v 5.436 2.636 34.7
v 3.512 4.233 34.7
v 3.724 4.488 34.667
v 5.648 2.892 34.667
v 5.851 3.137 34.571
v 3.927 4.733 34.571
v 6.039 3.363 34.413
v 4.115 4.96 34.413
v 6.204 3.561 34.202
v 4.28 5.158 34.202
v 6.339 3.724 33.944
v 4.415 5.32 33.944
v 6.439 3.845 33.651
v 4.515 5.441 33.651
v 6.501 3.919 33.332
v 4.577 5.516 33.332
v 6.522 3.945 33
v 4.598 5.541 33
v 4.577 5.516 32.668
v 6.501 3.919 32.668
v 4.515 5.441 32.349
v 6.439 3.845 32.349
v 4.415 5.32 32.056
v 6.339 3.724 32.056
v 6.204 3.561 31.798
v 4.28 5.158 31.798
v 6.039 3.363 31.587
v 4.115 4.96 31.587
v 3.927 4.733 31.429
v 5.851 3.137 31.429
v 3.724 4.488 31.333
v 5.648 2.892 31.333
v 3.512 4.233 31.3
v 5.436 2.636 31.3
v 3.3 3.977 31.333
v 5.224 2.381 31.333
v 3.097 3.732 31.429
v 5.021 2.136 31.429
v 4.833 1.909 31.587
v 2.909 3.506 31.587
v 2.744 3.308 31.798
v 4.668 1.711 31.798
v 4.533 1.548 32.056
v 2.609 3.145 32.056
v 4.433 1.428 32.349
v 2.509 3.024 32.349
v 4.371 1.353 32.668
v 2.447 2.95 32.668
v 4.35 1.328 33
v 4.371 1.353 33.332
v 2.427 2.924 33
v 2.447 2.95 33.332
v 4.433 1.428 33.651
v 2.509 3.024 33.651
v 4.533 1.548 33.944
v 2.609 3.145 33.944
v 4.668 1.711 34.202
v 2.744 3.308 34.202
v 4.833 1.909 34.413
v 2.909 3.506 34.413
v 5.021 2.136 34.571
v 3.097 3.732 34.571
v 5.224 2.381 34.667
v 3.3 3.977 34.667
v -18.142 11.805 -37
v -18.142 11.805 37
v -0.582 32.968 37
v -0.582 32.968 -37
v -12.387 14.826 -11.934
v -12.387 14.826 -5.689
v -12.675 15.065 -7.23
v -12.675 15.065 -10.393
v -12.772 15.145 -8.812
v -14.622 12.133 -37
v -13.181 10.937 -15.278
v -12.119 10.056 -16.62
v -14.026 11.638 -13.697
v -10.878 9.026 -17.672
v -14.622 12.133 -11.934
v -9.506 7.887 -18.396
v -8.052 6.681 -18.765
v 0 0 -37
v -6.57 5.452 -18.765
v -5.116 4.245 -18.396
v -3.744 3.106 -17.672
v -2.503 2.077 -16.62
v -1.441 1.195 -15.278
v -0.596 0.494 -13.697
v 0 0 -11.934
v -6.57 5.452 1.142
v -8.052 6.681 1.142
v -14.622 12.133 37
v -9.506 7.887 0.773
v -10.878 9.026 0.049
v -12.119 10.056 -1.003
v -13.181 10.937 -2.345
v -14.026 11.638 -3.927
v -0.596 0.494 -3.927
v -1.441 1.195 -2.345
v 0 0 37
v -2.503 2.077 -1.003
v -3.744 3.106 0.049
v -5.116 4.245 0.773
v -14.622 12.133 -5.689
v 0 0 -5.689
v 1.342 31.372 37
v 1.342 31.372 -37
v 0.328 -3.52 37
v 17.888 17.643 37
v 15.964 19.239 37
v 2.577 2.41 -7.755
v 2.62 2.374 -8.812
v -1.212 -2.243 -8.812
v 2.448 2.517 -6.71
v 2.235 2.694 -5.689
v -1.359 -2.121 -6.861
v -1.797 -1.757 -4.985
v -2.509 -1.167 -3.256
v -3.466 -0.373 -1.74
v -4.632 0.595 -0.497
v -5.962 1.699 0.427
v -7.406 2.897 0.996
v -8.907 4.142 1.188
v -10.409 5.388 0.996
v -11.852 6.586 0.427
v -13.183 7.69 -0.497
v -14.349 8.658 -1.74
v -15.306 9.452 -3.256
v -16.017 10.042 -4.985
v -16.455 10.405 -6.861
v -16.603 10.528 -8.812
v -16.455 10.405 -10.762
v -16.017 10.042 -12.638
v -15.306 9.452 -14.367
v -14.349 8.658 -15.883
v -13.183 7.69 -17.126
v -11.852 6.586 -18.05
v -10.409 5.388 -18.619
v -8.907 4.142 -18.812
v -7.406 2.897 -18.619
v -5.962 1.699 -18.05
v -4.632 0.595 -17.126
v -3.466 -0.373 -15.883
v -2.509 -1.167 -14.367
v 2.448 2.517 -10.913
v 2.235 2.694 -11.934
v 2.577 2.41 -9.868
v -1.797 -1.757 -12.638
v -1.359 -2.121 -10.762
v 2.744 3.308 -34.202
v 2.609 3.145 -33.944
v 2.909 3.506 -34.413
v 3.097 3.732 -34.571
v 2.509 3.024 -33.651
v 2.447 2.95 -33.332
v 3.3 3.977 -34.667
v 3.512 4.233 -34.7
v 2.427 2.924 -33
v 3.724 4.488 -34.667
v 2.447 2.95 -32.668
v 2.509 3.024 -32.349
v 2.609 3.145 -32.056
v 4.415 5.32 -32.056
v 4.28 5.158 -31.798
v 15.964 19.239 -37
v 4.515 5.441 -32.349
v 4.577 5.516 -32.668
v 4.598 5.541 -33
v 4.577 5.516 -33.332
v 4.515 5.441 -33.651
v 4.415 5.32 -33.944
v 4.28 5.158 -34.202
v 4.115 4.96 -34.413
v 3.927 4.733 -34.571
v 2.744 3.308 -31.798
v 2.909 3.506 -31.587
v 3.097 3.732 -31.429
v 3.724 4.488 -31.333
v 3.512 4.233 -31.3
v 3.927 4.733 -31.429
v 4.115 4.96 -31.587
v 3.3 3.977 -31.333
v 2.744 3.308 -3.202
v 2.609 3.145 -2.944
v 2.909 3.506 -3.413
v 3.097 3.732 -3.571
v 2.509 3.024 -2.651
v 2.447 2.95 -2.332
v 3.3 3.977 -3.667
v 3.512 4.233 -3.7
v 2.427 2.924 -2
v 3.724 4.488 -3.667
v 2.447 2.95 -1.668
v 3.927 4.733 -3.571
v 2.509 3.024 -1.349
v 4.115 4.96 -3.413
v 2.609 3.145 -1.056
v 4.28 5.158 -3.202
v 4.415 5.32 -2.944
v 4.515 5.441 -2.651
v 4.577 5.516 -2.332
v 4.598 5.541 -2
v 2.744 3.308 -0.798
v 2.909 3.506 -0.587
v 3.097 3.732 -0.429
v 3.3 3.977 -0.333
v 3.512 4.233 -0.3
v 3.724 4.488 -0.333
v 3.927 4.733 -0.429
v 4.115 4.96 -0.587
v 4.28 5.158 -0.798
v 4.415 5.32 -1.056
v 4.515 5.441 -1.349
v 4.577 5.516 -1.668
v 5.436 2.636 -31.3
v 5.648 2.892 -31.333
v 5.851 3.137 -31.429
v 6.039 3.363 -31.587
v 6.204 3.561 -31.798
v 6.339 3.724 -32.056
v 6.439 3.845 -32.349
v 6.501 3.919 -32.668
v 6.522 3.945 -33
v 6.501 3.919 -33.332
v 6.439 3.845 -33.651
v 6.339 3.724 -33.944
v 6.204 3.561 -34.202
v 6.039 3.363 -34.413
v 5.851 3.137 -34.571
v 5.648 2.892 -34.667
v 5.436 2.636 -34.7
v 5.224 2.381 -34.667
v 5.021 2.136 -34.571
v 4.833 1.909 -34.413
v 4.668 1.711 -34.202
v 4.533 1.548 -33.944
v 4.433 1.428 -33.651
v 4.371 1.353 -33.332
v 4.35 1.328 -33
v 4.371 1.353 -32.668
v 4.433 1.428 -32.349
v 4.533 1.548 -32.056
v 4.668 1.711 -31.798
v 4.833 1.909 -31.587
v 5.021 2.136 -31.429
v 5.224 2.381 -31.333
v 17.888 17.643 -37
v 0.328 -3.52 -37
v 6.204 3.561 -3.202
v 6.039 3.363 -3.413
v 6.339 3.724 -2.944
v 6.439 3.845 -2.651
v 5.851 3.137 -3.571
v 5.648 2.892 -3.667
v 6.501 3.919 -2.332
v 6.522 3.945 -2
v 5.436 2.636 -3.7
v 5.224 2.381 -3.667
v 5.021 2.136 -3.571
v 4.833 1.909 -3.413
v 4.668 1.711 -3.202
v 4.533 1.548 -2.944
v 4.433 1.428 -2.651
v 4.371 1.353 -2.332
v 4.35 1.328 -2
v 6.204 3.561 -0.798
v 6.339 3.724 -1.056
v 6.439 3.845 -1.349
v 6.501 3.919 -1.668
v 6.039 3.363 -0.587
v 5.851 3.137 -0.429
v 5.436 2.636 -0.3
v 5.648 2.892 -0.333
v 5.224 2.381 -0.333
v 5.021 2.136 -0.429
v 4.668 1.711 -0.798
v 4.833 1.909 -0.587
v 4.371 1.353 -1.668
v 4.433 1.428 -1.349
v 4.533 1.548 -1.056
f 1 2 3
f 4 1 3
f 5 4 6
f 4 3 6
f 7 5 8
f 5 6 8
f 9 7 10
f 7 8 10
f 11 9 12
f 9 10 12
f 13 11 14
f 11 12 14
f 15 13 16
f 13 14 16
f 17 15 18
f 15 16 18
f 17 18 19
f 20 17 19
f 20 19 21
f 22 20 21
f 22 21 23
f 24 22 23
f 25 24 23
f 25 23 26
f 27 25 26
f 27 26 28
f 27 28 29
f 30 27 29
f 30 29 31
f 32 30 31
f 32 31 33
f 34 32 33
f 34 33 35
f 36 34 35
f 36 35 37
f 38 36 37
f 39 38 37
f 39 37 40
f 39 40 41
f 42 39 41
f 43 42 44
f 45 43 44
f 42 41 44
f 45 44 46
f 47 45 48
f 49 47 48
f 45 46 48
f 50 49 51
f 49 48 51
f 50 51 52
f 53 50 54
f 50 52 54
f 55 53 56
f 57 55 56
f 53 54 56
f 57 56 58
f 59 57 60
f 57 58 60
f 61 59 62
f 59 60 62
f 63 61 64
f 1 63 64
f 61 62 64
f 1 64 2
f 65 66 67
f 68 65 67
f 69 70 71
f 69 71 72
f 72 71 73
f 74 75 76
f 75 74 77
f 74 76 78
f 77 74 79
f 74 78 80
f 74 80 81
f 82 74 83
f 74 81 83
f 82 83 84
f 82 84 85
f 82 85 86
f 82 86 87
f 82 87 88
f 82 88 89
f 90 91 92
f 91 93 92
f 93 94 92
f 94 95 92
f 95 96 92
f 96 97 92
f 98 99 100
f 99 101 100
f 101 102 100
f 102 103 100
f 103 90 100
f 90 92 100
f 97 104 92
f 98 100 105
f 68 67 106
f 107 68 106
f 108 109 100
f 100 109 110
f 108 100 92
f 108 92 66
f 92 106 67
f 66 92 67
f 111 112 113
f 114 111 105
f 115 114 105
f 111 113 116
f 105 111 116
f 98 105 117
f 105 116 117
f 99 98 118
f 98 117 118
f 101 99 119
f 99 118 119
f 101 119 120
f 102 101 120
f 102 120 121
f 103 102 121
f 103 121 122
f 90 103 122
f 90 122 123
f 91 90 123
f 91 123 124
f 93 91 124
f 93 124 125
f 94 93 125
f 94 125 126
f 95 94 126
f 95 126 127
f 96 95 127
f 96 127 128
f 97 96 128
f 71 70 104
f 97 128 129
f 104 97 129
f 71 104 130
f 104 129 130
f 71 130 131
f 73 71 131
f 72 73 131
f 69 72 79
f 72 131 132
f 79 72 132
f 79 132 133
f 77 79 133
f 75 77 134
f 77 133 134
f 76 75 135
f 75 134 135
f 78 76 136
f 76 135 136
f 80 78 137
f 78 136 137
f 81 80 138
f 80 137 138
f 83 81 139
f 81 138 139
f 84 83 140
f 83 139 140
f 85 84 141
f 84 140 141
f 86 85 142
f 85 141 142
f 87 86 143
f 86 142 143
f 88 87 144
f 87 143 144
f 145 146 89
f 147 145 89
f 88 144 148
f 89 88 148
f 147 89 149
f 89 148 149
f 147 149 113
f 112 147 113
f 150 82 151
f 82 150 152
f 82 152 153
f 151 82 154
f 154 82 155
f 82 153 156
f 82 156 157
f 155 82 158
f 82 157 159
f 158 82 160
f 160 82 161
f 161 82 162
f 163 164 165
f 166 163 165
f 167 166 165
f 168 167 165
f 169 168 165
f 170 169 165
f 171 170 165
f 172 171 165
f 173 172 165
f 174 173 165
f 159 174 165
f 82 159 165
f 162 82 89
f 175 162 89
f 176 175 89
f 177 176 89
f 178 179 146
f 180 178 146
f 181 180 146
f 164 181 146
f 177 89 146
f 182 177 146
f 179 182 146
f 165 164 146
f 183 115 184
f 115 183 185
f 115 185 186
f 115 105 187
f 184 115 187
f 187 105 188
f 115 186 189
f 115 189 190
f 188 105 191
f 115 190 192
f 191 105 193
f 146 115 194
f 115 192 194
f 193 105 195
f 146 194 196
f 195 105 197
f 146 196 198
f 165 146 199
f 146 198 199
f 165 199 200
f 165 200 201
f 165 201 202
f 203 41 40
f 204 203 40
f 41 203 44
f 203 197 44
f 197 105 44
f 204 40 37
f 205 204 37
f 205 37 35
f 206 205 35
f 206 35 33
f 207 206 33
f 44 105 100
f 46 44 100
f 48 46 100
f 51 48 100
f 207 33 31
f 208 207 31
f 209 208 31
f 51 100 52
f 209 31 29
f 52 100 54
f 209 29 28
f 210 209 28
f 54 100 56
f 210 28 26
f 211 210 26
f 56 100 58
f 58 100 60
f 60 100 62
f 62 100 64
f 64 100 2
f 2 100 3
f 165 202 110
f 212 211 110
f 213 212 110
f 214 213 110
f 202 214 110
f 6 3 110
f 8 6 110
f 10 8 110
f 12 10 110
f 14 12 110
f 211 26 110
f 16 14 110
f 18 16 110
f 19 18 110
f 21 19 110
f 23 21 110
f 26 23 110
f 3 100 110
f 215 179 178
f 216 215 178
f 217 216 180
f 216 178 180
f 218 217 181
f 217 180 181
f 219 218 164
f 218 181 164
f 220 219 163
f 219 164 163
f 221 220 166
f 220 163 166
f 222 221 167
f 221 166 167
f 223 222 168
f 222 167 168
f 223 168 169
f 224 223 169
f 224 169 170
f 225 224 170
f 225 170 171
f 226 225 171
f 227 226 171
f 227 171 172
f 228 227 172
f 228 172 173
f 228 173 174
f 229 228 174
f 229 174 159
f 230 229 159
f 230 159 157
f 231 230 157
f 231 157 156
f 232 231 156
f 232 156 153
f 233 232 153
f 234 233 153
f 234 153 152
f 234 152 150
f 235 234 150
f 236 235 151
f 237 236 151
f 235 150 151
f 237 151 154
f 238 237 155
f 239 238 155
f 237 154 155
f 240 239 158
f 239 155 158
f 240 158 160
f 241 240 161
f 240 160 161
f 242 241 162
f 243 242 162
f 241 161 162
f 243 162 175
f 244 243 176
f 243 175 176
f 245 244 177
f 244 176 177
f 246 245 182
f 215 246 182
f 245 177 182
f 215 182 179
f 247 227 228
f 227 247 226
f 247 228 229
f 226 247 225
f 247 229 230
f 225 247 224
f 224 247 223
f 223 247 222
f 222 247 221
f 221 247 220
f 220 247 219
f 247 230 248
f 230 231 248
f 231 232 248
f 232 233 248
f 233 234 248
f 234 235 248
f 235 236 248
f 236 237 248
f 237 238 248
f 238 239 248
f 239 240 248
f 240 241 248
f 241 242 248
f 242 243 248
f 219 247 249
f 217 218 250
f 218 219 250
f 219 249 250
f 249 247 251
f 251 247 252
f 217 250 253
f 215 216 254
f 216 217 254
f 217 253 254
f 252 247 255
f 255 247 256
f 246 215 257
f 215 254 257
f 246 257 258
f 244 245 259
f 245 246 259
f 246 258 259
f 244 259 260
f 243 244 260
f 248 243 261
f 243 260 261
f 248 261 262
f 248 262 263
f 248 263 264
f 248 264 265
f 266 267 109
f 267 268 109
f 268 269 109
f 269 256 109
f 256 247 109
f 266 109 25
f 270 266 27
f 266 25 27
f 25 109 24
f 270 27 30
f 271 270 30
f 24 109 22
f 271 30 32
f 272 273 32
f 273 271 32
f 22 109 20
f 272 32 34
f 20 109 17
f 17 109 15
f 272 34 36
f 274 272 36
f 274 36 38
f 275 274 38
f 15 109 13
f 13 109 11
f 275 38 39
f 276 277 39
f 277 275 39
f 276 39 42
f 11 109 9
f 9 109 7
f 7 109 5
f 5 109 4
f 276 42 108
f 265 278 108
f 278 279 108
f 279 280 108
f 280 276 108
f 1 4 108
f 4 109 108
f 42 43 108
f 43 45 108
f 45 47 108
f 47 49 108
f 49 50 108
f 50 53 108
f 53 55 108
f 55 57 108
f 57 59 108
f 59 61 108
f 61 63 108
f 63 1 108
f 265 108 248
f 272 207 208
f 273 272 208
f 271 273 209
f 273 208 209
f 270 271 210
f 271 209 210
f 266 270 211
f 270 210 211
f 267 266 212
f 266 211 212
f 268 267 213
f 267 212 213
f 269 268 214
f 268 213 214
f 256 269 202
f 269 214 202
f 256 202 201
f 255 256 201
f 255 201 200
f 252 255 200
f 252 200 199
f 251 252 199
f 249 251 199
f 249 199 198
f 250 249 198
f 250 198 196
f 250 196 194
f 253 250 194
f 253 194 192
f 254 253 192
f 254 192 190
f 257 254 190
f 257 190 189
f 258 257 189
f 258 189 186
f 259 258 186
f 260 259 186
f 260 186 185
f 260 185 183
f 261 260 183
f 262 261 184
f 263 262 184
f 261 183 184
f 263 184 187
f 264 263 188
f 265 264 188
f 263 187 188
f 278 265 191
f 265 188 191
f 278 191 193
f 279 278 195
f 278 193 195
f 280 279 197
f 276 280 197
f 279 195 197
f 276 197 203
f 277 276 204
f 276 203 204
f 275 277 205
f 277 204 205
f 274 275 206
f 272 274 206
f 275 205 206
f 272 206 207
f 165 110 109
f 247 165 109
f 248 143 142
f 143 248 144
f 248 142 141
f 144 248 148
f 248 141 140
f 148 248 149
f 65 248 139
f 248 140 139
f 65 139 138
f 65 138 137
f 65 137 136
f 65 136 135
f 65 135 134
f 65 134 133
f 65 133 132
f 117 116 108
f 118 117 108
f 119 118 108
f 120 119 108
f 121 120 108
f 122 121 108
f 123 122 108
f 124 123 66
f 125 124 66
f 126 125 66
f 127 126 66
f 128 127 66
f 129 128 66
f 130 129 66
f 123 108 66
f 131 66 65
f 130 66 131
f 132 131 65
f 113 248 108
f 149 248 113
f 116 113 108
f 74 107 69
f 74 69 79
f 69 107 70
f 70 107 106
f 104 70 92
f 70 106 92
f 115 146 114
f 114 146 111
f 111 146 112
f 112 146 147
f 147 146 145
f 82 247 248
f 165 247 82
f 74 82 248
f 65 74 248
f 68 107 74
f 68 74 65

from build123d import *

# Parameters (mm, degrees)
ESTRUSIONE_SOTTILE1_DEPTH      = 37
ESTRUSIONE_SOTTILE1_DEPTH_BACK = 37
SCHIZZO2_R                     = 1.7
TAGLIO_ESTRUSIONE2_DEPTH       = 23
SCHIZZO3_R                     = 10
TAGLIO_ESTRUSIONE3_DEPTH       = 6
SCHIZZO4_W                     = 19
SCHIZZO4_H                     = 35
TAGLIO_ESTRUSIONE4_DEPTH       = 9
SCHIZZO5_R                     = 1.7
TAGLIO_ESTRUSIONE5_DEPTH       = 9
TAGLIO_ESTRUSIONE6_DEPTH       = 38
TAGLIO_ESTRUSIONE6_DEPTH_BACK  = 38


with BuildPart() as part:
    # Schizzo1 → Estrusione-Sottile1 (new body, two sides)
    with BuildSketch(Plane.XY) as estrusione_sottile1_sk:
        with BuildLine():
            Line((1.3418419, 31.371953403), (-14.62198067, 12.132505153))
            Line((-14.62198067, 12.132505153), (0, 0))
            Line((0, 0), (76.626348337, 92.349351598))
            ThreePointArc((76.626348337, 92.349351598), (100.821605793, 105.569380982), (125.016863249, 92.349351598))
            Line((125.016863249, 92.349351598), (132.637123428, 81.561358928))
            Line((132.637123428, 81.561358928), (153.805626203, 63.996914357))
            Line((153.805626203, 63.996914357), (152.209243946, 62.072969532))
            Line((152.209243946, 62.072969532), (130.786083182, 79.848715119))
            Line((130.786083182, 79.848715119), (122.942210931, 90.953275114))
            ThreePointArc((122.942210931, 90.953275114), (100.774095149, 103.069337988), (78.649981188, 90.873112409))
            Line((78.649981188, 90.873112409), (0.327562568, -3.520327082))
            Line((0.327562568, -3.520327082), (-18.142307752, 11.804942585))
            Line((-18.142307752, 11.804942585), (-0.582102925, 32.96833566))
            Line((-0.582102925, 32.96833566), (1.3418419, 31.371953403))
        make_face()
    extrude(amount=ESTRUSIONE_SOTTILE1_DEPTH)
    extrude(estrusione_sottile1_sk.sketch, amount=-ESTRUSIONE_SOTTILE1_DEPTH_BACK)

    # Schizzo2 → Taglio-Estrusione2 (cut)
    with BuildSketch(Plane(origin=(1.923944825, -1.596382257, 0), x_dir=(0, 0, -1), z_dir=(0.76957793, -0.638552903, 0))):
        with Locations((-6.552412565, 114.869422042)):
            Circle(SCHIZZO2_R)
        with Locations((-6.552412565, 104.052556993)):
            Circle(SCHIZZO2_R)
        with Locations((1.452296176, 109.710473024)):
            Circle(SCHIZZO2_R)
        with Locations((9.457004918, 104.551524007)):
            Circle(SCHIZZO2_R)
        with Locations((1.553386665, 98.82845624)):
            Circle(SCHIZZO2_R)
        with Locations((9.659185895, 93.604355486)):
            Circle(SCHIZZO2_R)
    extrude(amount=-TAGLIO_ESTRUSIONE2_DEPTH, mode=Mode.SUBTRACT)

    # Schizzo3 → Taglio-Estrusione3 (cut)
    with BuildSketch(Plane(origin=(-1.596382257, -1.923944825, 0), x_dir=(0.76957793, -0.638552903, 0), z_dir=(-0.638552903, -0.76957793, 0))):
        with Locations((-9.5, -8.811563563)):
            Circle(SCHIZZO3_R)
    extrude(amount=-TAGLIO_ESTRUSIONE3_DEPTH, mode=Mode.SUBTRACT)

    # Schizzo4 → Taglio-Estrusione4 (cut)
    with BuildSketch(Plane(origin=(0, 0, 0), x_dir=(0, 0, 1), z_dir=(-0.76957793, 0.638552903, 0))):
        with Locations((-7.5, 57.5)):
            Rectangle(SCHIZZO4_W, SCHIZZO4_H)
    extrude(amount=-TAGLIO_ESTRUSIONE4_DEPTH, mode=Mode.SUBTRACT)

    # Schizzo5 → Taglio-Estrusione5 (cut)
    with BuildSketch(Plane(origin=(0, 0, 0), x_dir=(0, 0, 1), z_dir=(-0.76957793, 0.638552903, 0))):
        with Locations((33, 5.5)):
            Circle(SCHIZZO5_R)
        with Locations((-33, 5.5)):
            Circle(SCHIZZO5_R)
        with Locations((-2, 5.5)):
            Circle(SCHIZZO5_R)
    extrude(amount=-TAGLIO_ESTRUSIONE5_DEPTH, mode=Mode.SUBTRACT)

    # Schizzo6 → Taglio-Estrusione6 (cut, two sides)
    with BuildSketch(Plane.XY) as taglio_estrusione6_sk:
        Polygon((1.3418419, 31.371953403), (32.99116726, 5.111106005), (167.345945228, 57.415127601), (141.955436185, 113.188092886), (32.984624639, 110.825582067), align=None)
    extrude(amount=TAGLIO_ESTRUSIONE6_DEPTH, mode=Mode.SUBTRACT)
    extrude(taglio_estrusione6_sk.sketch, amount=-TAGLIO_ESTRUSIONE6_DEPTH_BACK, mode=Mode.SUBTRACT)


solid = part.part
